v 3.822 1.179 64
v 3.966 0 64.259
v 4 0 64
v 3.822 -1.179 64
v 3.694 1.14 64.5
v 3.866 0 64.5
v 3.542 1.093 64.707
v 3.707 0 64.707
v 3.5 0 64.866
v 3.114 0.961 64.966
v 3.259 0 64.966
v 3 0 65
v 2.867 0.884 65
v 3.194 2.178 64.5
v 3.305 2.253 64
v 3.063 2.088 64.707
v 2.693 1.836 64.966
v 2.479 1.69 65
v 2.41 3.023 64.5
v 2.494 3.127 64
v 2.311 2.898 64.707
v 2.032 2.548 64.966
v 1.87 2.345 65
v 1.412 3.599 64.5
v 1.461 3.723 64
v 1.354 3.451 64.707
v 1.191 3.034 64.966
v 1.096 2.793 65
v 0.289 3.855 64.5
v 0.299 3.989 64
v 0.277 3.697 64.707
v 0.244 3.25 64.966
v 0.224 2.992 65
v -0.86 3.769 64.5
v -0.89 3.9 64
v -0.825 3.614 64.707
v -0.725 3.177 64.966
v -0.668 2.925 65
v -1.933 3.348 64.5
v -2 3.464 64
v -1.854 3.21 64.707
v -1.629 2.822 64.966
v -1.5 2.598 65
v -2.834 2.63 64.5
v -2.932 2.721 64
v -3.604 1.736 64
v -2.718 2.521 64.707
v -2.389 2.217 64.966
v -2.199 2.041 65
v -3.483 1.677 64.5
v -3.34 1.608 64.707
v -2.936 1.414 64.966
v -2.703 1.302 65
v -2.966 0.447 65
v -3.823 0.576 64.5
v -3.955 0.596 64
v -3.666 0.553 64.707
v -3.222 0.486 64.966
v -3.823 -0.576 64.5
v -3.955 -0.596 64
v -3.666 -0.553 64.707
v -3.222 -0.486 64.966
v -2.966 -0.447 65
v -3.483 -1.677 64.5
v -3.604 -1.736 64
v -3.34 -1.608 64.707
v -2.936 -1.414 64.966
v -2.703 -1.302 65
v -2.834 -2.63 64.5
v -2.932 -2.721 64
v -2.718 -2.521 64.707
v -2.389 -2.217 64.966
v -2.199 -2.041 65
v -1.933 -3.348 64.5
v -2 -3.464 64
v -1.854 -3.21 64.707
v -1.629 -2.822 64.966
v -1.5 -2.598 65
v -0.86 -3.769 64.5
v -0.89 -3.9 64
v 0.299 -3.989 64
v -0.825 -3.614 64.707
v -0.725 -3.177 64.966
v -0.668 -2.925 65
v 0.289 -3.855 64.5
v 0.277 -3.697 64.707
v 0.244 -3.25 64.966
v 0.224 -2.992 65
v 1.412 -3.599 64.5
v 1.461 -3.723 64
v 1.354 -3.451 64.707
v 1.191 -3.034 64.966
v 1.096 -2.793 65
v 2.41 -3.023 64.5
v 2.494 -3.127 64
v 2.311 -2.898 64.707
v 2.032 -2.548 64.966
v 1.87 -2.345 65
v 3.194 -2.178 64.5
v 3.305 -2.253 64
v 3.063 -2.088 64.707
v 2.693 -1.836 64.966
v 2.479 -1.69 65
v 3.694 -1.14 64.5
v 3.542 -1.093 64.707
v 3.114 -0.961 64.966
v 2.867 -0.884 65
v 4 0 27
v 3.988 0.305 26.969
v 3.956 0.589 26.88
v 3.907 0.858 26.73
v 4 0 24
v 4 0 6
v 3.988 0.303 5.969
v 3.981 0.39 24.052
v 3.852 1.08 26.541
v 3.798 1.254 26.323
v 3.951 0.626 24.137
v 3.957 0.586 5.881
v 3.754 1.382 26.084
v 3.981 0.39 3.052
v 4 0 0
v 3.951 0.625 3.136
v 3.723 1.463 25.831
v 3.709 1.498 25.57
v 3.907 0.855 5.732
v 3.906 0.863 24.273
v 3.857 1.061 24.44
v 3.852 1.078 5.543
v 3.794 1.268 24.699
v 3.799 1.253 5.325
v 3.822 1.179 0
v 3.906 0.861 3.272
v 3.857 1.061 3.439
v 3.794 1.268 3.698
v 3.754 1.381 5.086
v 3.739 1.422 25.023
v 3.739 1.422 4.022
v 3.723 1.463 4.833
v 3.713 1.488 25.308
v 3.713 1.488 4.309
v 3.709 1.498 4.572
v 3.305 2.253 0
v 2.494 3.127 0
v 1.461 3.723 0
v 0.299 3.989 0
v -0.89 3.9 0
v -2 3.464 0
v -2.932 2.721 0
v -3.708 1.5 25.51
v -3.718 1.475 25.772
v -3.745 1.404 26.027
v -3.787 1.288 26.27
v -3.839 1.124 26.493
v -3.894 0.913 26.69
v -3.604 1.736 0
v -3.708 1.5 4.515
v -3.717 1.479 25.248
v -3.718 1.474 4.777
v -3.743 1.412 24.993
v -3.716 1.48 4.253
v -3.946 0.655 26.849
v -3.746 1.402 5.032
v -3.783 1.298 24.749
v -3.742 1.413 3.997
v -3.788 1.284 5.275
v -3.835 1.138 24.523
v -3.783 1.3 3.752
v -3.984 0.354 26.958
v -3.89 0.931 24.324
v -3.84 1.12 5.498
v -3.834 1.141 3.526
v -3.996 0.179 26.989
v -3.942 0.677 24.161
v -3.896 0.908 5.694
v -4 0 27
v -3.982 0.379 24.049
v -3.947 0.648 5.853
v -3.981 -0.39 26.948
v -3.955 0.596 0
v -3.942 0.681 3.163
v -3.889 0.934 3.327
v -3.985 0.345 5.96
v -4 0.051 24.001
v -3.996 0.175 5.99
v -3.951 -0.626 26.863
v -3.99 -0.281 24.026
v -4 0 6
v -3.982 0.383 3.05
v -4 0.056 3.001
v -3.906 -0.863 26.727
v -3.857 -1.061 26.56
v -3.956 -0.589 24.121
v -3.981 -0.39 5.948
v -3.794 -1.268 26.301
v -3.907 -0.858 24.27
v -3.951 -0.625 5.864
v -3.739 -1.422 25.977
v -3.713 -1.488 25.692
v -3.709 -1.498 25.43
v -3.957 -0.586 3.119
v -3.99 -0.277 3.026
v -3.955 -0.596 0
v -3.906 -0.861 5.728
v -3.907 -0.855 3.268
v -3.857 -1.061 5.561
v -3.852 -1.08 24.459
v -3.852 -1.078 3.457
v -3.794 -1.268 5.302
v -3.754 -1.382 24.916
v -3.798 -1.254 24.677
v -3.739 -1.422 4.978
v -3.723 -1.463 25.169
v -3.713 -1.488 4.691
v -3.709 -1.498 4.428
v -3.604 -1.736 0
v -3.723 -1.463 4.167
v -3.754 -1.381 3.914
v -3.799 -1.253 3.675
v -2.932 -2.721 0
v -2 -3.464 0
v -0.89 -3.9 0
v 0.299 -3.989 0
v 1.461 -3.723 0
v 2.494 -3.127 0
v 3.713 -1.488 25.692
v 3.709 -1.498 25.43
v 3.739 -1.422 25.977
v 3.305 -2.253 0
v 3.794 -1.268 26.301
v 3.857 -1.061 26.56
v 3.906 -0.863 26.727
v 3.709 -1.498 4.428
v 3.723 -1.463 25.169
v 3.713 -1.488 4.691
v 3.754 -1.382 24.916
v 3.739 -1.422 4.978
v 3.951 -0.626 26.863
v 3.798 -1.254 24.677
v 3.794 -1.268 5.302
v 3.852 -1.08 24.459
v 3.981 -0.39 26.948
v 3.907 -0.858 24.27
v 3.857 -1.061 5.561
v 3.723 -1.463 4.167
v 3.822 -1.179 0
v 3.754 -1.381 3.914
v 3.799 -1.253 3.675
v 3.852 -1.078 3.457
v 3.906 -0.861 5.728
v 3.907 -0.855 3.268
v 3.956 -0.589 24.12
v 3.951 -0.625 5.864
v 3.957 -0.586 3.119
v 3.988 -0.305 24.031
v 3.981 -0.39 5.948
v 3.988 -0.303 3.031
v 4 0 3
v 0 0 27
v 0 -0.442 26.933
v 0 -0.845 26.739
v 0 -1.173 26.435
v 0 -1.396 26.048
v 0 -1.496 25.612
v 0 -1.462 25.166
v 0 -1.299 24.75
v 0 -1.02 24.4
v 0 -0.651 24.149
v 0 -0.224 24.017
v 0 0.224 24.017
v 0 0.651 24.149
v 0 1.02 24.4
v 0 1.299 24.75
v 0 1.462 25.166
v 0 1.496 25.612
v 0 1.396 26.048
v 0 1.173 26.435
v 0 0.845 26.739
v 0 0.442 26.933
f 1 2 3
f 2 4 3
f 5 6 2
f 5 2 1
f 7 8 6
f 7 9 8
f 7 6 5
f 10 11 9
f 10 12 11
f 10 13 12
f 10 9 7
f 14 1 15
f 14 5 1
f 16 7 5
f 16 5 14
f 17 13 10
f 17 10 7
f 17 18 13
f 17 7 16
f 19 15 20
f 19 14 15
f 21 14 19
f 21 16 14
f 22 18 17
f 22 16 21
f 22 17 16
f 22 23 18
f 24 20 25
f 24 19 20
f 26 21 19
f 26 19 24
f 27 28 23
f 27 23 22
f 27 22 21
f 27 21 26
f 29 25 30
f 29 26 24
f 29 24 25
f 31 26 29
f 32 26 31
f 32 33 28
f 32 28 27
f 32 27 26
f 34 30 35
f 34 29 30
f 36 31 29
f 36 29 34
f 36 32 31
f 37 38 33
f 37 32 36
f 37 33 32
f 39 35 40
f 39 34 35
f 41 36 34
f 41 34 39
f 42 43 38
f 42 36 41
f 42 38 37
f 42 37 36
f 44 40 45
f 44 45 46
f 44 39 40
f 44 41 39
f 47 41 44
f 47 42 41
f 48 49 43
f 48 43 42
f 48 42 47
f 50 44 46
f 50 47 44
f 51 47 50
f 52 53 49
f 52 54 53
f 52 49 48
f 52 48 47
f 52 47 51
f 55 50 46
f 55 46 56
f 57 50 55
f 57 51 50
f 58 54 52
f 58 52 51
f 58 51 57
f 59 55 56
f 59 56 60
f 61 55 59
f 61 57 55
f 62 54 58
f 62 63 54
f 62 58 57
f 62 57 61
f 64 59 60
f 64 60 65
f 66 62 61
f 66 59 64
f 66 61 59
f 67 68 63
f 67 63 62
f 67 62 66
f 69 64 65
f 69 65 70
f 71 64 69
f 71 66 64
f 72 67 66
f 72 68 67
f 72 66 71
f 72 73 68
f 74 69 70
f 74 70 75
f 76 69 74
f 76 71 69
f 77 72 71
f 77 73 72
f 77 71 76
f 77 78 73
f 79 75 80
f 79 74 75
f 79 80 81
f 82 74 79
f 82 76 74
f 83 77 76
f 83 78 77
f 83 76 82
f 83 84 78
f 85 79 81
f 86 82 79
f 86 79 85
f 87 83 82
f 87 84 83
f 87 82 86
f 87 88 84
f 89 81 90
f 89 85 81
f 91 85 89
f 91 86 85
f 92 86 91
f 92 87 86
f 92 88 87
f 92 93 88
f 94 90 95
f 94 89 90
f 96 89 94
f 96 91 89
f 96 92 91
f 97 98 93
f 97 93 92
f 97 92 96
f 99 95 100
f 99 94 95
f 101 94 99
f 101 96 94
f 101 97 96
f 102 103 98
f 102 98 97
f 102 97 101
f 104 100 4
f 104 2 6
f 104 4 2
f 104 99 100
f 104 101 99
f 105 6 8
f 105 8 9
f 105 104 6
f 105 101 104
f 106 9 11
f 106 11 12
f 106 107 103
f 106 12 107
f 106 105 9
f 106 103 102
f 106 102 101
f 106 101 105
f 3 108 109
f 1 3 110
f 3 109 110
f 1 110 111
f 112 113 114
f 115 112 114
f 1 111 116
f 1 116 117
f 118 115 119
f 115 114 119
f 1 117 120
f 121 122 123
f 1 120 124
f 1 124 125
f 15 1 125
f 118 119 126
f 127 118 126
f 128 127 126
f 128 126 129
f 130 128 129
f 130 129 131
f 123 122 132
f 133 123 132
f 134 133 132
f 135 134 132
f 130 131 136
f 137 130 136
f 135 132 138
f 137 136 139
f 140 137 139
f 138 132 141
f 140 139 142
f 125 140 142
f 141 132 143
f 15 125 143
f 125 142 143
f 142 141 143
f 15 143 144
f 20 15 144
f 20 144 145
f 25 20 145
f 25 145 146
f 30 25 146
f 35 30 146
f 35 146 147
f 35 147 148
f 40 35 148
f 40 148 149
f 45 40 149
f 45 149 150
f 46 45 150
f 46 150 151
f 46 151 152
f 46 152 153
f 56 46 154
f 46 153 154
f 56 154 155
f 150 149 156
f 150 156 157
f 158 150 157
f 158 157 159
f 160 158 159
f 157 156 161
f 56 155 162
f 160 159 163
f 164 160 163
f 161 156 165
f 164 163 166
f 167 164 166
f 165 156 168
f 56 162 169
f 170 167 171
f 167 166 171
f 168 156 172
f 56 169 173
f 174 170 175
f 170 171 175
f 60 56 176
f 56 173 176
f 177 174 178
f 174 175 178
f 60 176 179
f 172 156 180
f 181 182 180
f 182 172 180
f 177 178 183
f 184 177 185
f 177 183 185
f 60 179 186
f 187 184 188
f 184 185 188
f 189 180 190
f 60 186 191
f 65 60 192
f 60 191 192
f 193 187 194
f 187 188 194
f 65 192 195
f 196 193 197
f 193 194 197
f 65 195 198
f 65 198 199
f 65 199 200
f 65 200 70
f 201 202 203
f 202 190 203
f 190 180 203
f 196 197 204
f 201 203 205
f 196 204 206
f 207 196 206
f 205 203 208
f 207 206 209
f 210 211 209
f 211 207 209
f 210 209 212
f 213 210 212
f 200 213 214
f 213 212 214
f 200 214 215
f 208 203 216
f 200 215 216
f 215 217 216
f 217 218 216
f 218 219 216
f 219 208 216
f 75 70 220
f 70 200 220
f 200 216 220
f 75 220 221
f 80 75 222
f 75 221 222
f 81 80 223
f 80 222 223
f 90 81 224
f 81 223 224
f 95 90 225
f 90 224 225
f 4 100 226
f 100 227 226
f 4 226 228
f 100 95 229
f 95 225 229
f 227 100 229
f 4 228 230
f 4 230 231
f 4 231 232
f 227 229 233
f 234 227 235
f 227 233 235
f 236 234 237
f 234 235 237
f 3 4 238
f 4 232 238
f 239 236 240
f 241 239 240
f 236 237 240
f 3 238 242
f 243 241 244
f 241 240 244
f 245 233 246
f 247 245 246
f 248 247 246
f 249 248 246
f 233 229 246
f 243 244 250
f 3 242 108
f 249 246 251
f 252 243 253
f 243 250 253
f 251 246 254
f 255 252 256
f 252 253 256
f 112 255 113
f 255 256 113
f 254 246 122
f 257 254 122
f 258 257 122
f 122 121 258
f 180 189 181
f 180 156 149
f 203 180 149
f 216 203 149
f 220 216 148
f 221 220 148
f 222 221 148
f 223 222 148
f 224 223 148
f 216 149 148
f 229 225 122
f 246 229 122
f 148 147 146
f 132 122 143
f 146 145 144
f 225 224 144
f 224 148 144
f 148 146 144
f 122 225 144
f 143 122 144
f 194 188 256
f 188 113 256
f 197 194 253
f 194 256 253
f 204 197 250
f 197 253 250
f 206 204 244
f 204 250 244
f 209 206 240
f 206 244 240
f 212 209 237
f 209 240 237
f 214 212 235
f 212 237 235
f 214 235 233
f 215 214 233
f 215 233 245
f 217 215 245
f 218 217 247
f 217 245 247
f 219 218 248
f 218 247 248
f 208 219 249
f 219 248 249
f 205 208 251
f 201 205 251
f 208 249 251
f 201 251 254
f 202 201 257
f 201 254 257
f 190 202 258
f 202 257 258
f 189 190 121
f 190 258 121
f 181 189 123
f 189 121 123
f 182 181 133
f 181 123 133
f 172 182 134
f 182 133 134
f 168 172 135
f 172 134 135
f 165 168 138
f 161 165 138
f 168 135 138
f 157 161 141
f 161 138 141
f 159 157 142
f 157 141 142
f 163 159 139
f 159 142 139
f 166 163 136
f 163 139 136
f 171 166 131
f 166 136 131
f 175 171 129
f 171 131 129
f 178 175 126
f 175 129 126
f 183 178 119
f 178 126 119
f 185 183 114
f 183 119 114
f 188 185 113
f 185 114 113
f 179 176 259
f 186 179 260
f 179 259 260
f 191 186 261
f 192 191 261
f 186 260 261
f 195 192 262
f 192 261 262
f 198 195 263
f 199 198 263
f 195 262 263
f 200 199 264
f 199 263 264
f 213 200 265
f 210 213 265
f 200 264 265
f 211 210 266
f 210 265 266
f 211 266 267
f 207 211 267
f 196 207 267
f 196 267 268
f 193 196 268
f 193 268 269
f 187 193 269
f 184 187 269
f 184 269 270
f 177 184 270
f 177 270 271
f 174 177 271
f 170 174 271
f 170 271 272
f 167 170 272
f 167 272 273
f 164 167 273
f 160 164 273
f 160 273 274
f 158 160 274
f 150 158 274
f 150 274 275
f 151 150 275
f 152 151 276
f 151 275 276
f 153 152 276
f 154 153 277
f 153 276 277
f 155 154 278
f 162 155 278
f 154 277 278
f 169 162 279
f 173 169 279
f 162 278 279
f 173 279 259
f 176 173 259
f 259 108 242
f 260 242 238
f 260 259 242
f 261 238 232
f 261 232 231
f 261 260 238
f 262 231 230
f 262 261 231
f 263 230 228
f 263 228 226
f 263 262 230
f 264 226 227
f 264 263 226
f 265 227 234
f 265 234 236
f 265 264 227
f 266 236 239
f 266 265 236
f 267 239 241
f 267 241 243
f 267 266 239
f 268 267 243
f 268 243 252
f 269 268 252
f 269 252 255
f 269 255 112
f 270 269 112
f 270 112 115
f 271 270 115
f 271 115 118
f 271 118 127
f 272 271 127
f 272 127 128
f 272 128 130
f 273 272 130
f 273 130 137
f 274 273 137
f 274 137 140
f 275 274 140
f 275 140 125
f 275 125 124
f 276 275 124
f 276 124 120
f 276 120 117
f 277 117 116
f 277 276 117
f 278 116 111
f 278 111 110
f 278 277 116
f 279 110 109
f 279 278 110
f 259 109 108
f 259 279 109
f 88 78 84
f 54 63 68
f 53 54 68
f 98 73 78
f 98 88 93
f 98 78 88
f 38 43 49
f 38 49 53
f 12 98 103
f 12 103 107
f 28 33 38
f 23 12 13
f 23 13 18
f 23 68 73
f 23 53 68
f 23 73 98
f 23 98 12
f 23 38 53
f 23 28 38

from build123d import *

# Parameters (mm, degrees)
ESQUISSE1_R             = 4
BOSS_EXTRU_1_DEPTH      = 65
ESQUISSE2_R             = 1.5
ENL_V_MAT_EXTRU_1_DEPTH = 5
CONG_1_R                = 1


with BuildPart() as part:
    # Esquisse1 → Boss.-Extru.1 (new body)
    with BuildSketch(Plane.XY):
        Circle(ESQUISSE1_R)
    extrude(amount=BOSS_EXTRU_1_DEPTH)

    # Esquisse2 → Enlèv. mat.-Extru.1 (cut, symmetric)
    with BuildSketch(Plane(origin=(0, 0, 0), x_dir=(0, 0, -1), z_dir=(1, 0, 0))):
        with Locations(Location((-25.5, 0, 0), (0, 0, 179.999999999))):
            Circle(ESQUISSE2_R)
        with Locations(Location((-4.5, 0, 0), (0, 0, 179.999999999))):
            Circle(ESQUISSE2_R)
    extrude(amount=ENL_V_MAT_EXTRU_1_DEPTH, both=True, mode=Mode.SUBTRACT)

    # Congé1
    cong_1_edges = [part.edges().sort_by_distance(p)[0] for p in [
        (-4, 0, 65),
    ]]
    fillet(cong_1_edges, radius=CONG_1_R)


solid = part.part
